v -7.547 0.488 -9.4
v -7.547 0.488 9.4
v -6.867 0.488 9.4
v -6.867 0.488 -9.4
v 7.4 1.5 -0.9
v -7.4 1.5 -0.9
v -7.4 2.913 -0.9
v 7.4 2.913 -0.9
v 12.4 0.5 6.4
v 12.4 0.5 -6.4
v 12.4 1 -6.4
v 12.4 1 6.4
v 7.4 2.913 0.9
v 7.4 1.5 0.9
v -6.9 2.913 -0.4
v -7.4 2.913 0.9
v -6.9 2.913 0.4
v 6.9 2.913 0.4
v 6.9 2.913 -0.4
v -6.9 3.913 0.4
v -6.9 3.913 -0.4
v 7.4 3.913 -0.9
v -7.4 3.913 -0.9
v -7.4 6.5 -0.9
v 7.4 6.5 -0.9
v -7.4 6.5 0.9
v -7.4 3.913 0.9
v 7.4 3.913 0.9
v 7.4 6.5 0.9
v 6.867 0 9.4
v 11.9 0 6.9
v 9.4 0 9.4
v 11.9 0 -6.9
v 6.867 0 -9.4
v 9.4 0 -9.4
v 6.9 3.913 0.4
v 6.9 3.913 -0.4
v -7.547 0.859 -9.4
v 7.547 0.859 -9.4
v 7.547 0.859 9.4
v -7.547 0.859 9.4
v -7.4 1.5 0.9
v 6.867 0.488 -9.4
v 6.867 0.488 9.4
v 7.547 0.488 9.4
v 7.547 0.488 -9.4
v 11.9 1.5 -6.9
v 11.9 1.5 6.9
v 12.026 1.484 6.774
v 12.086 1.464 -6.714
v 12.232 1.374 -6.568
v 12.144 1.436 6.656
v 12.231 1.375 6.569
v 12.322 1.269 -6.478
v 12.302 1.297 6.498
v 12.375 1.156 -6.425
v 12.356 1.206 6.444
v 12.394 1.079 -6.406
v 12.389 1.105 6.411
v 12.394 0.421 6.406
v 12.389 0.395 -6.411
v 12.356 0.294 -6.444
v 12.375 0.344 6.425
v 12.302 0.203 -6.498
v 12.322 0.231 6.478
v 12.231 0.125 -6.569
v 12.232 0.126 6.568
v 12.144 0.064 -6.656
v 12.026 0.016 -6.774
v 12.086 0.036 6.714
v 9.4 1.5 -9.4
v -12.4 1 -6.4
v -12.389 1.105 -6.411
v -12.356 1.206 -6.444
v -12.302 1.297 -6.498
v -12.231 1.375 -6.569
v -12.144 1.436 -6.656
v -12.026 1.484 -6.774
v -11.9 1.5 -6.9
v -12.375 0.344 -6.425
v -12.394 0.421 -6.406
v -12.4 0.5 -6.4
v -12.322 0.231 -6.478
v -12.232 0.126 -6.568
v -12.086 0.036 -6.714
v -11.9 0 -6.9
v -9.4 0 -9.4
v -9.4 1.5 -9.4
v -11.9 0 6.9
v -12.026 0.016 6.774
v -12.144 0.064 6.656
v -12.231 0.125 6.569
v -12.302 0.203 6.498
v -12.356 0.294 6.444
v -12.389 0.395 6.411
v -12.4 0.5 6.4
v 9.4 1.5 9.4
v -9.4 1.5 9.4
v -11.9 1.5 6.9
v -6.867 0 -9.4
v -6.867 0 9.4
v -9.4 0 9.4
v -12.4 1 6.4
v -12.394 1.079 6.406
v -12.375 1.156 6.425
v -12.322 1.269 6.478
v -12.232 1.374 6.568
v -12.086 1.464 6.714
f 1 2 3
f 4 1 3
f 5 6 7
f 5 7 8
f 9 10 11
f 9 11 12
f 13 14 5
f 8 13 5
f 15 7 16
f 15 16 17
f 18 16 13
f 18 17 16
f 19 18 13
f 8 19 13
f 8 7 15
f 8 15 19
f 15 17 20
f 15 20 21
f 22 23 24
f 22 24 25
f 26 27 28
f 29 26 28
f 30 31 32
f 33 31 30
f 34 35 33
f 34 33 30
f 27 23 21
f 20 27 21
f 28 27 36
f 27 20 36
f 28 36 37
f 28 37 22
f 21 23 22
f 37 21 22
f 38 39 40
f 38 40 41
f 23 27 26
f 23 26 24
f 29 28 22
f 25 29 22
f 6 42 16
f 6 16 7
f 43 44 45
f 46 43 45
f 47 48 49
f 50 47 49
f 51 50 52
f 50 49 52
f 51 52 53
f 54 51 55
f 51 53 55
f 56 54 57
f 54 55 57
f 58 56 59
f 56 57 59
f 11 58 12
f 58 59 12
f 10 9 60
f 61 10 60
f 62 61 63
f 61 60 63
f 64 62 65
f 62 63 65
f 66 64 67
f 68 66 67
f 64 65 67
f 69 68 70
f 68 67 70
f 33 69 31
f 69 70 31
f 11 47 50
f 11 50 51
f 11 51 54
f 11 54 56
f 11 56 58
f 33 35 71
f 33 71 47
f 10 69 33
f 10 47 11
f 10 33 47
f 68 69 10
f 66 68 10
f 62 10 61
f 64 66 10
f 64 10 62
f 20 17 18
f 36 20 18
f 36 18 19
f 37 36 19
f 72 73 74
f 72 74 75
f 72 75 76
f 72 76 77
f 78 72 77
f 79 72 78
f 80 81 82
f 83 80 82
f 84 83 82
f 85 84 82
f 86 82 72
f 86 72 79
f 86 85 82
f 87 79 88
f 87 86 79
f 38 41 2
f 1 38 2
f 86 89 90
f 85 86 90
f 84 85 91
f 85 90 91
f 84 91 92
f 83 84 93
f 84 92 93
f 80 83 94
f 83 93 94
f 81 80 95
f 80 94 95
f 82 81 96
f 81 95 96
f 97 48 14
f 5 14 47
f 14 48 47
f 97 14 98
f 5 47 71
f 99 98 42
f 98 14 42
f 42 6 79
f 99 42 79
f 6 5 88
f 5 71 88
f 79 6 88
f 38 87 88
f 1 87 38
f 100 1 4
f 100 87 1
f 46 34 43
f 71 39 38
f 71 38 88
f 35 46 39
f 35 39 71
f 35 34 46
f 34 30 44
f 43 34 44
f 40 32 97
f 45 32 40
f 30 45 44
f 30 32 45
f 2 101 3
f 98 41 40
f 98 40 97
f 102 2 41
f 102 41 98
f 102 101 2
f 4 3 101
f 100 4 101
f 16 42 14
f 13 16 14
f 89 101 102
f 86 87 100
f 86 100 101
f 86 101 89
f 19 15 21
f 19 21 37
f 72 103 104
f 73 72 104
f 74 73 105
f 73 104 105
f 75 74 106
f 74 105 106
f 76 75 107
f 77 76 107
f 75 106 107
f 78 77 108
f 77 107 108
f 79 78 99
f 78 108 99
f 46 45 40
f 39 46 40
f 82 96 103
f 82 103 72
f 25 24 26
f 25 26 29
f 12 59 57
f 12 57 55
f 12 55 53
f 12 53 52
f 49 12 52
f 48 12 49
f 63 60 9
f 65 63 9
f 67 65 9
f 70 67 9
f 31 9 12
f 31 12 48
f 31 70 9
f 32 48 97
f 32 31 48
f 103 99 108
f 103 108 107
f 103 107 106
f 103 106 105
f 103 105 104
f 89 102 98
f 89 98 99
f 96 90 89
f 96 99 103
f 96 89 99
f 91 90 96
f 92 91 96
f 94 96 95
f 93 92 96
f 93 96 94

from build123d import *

# Parameters (mm, degrees)
EXTRUDE_1_DEPTH          = 1.5
SKETCH_2_W               = 14.8
SKETCH_2_H               = 1.8
EXTRUDE_2_DEPTH          = 5
SKETCH_5_W               = 0.478908464
SKETCH_5_H               = 0.127427029
CUT_EXTRUDE_1_DEPTH      = 0.1
CUT_EXTRUDE_2_DEPTH      = 0.5
CUT_EXTRUDE_2_DEPTH_BACK = 0.5
SKETCH_4_W               = 15.629806388
SKETCH_4_H               = 2.571592952
SKETCH_4_W_2             = 13.8
SKETCH_4_H_2             = 0.8
CUT_EXTRUDE_3_DEPTH      = 117.5
CUT_EXTRUDE_4_DEPTH      = 19.5


with BuildPart() as part:
    # 草图1 → 凸台-拉伸1 (new body)
    with BuildSketch(Plane(origin=(0, 0, 0), x_dir=(1, 0, 0), z_dir=(0, 1, 0))):
        Polygon((-12.4, 6.4), (-9.4, 9.4), (9.4, 9.4), (12.4, 6.4), (12.4, -6.4), (9.4, -9.4), (-9.4, -9.4), (-12.4, -6.4), align=None)
    extrude(amount=EXTRUDE_1_DEPTH)

    # 草图2 → 凸台-拉伸2 (add)
    with BuildSketch(Plane(origin=(0, 1.5, 0), x_dir=(1, 0, 0), z_dir=(0, 1, 0))):
        Rectangle(SKETCH_2_W, SKETCH_2_H)
    extrude(amount=EXTRUDE_2_DEPTH)

    # 草图5 → 切除-拉伸1 (cut)
    with BuildSketch(Plane.XY.offset(0.9)):
        with Locations((-7.4, 3.476334332)):
            Rectangle(SKETCH_5_W, SKETCH_5_H)
    extrude(amount=-CUT_EXTRUDE_1_DEPTH, mode=Mode.SUBTRACT)

    # 草图4 → 切除-拉伸2 (cut, two sides: drawn at the far end of the back side and taken through both)
    with BuildSketch(Plane(origin=(0, 3.412620817, 0), x_dir=(1, 0, 0), z_dir=(0, 1, 0)).offset(-CUT_EXTRUDE_2_DEPTH_BACK)):
        Rectangle(SKETCH_4_W, SKETCH_4_H)
        Rectangle(SKETCH_4_W_2, SKETCH_4_H_2, mode=Mode.SUBTRACT)
    extrude(amount=CUT_EXTRUDE_2_DEPTH + CUT_EXTRUDE_2_DEPTH_BACK, mode=Mode.SUBTRACT)

    # 草图6 → 切除-拉伸3 (cut)
    with BuildSketch(Plane.XY.offset(9.4)):
        Polygon((-6.867040084, 0.488052507), (-6.867040084, 0), (0, 0), (0, 0.859235203), (-7.547096834, 0.859235203), (-7.547096834, 0.488052507), align=None)
        Polygon((0, 0.859235203), (0, 0), (6.867040084, 0), (6.867040084, 0.488052507), (7.547096834, 0.488052507), (7.547096834, 0.859235203), align=None)
    extrude(amount=-CUT_EXTRUDE_3_DEPTH, mode=Mode.SUBTRACT)

    # 草图9 → 切除-拉伸4 (cut)
    with BuildSketch(Plane.XY.offset(9.4)):
        with BuildLine():
            Line((-9.4, 0), (-11.9, 0))
            ThreePointArc((-11.9, 0), (-12.253553391, 0.146446609), (-12.4, 0.5))
            Line((-12.4, 0.5), (-12.4, 1))
            ThreePointArc((-12.4, 1), (-12.253553391, 1.353553391), (-11.9, 1.5))
            Line((-11.9, 1.5), (-13.659182298, 1.5))
            Line((-13.659182298, 1.5), (-13.659182298, -1.631891655))
            Line((-13.659182298, -1.631891655), (14.456410837, -1.631891655))
            Line((14.456410837, -1.631891655), (14.456410837, 1.5))
            Line((14.456410837, 1.5), (11.9, 1.5))
            ThreePointArc((11.9, 1.5), (12.253553391, 1.353553391), (12.4, 1))
            Line((12.4, 1), (12.4, 0.5))
            ThreePointArc((12.4, 0.5), (12.253553391, 0.146446609), (11.9, 0))
            Line((11.9, 0), (9.4, 0))
            Line((9.4, 0), (6.867040084, 0))
            Line((6.867040084, 0), (-6.867040084, 0))
            Line((-6.867040084, 0), (-9.4, 0))
        make_face()
    extrude(amount=-CUT_EXTRUDE_4_DEPTH, mode=Mode.SUBTRACT)


solid = part.part
